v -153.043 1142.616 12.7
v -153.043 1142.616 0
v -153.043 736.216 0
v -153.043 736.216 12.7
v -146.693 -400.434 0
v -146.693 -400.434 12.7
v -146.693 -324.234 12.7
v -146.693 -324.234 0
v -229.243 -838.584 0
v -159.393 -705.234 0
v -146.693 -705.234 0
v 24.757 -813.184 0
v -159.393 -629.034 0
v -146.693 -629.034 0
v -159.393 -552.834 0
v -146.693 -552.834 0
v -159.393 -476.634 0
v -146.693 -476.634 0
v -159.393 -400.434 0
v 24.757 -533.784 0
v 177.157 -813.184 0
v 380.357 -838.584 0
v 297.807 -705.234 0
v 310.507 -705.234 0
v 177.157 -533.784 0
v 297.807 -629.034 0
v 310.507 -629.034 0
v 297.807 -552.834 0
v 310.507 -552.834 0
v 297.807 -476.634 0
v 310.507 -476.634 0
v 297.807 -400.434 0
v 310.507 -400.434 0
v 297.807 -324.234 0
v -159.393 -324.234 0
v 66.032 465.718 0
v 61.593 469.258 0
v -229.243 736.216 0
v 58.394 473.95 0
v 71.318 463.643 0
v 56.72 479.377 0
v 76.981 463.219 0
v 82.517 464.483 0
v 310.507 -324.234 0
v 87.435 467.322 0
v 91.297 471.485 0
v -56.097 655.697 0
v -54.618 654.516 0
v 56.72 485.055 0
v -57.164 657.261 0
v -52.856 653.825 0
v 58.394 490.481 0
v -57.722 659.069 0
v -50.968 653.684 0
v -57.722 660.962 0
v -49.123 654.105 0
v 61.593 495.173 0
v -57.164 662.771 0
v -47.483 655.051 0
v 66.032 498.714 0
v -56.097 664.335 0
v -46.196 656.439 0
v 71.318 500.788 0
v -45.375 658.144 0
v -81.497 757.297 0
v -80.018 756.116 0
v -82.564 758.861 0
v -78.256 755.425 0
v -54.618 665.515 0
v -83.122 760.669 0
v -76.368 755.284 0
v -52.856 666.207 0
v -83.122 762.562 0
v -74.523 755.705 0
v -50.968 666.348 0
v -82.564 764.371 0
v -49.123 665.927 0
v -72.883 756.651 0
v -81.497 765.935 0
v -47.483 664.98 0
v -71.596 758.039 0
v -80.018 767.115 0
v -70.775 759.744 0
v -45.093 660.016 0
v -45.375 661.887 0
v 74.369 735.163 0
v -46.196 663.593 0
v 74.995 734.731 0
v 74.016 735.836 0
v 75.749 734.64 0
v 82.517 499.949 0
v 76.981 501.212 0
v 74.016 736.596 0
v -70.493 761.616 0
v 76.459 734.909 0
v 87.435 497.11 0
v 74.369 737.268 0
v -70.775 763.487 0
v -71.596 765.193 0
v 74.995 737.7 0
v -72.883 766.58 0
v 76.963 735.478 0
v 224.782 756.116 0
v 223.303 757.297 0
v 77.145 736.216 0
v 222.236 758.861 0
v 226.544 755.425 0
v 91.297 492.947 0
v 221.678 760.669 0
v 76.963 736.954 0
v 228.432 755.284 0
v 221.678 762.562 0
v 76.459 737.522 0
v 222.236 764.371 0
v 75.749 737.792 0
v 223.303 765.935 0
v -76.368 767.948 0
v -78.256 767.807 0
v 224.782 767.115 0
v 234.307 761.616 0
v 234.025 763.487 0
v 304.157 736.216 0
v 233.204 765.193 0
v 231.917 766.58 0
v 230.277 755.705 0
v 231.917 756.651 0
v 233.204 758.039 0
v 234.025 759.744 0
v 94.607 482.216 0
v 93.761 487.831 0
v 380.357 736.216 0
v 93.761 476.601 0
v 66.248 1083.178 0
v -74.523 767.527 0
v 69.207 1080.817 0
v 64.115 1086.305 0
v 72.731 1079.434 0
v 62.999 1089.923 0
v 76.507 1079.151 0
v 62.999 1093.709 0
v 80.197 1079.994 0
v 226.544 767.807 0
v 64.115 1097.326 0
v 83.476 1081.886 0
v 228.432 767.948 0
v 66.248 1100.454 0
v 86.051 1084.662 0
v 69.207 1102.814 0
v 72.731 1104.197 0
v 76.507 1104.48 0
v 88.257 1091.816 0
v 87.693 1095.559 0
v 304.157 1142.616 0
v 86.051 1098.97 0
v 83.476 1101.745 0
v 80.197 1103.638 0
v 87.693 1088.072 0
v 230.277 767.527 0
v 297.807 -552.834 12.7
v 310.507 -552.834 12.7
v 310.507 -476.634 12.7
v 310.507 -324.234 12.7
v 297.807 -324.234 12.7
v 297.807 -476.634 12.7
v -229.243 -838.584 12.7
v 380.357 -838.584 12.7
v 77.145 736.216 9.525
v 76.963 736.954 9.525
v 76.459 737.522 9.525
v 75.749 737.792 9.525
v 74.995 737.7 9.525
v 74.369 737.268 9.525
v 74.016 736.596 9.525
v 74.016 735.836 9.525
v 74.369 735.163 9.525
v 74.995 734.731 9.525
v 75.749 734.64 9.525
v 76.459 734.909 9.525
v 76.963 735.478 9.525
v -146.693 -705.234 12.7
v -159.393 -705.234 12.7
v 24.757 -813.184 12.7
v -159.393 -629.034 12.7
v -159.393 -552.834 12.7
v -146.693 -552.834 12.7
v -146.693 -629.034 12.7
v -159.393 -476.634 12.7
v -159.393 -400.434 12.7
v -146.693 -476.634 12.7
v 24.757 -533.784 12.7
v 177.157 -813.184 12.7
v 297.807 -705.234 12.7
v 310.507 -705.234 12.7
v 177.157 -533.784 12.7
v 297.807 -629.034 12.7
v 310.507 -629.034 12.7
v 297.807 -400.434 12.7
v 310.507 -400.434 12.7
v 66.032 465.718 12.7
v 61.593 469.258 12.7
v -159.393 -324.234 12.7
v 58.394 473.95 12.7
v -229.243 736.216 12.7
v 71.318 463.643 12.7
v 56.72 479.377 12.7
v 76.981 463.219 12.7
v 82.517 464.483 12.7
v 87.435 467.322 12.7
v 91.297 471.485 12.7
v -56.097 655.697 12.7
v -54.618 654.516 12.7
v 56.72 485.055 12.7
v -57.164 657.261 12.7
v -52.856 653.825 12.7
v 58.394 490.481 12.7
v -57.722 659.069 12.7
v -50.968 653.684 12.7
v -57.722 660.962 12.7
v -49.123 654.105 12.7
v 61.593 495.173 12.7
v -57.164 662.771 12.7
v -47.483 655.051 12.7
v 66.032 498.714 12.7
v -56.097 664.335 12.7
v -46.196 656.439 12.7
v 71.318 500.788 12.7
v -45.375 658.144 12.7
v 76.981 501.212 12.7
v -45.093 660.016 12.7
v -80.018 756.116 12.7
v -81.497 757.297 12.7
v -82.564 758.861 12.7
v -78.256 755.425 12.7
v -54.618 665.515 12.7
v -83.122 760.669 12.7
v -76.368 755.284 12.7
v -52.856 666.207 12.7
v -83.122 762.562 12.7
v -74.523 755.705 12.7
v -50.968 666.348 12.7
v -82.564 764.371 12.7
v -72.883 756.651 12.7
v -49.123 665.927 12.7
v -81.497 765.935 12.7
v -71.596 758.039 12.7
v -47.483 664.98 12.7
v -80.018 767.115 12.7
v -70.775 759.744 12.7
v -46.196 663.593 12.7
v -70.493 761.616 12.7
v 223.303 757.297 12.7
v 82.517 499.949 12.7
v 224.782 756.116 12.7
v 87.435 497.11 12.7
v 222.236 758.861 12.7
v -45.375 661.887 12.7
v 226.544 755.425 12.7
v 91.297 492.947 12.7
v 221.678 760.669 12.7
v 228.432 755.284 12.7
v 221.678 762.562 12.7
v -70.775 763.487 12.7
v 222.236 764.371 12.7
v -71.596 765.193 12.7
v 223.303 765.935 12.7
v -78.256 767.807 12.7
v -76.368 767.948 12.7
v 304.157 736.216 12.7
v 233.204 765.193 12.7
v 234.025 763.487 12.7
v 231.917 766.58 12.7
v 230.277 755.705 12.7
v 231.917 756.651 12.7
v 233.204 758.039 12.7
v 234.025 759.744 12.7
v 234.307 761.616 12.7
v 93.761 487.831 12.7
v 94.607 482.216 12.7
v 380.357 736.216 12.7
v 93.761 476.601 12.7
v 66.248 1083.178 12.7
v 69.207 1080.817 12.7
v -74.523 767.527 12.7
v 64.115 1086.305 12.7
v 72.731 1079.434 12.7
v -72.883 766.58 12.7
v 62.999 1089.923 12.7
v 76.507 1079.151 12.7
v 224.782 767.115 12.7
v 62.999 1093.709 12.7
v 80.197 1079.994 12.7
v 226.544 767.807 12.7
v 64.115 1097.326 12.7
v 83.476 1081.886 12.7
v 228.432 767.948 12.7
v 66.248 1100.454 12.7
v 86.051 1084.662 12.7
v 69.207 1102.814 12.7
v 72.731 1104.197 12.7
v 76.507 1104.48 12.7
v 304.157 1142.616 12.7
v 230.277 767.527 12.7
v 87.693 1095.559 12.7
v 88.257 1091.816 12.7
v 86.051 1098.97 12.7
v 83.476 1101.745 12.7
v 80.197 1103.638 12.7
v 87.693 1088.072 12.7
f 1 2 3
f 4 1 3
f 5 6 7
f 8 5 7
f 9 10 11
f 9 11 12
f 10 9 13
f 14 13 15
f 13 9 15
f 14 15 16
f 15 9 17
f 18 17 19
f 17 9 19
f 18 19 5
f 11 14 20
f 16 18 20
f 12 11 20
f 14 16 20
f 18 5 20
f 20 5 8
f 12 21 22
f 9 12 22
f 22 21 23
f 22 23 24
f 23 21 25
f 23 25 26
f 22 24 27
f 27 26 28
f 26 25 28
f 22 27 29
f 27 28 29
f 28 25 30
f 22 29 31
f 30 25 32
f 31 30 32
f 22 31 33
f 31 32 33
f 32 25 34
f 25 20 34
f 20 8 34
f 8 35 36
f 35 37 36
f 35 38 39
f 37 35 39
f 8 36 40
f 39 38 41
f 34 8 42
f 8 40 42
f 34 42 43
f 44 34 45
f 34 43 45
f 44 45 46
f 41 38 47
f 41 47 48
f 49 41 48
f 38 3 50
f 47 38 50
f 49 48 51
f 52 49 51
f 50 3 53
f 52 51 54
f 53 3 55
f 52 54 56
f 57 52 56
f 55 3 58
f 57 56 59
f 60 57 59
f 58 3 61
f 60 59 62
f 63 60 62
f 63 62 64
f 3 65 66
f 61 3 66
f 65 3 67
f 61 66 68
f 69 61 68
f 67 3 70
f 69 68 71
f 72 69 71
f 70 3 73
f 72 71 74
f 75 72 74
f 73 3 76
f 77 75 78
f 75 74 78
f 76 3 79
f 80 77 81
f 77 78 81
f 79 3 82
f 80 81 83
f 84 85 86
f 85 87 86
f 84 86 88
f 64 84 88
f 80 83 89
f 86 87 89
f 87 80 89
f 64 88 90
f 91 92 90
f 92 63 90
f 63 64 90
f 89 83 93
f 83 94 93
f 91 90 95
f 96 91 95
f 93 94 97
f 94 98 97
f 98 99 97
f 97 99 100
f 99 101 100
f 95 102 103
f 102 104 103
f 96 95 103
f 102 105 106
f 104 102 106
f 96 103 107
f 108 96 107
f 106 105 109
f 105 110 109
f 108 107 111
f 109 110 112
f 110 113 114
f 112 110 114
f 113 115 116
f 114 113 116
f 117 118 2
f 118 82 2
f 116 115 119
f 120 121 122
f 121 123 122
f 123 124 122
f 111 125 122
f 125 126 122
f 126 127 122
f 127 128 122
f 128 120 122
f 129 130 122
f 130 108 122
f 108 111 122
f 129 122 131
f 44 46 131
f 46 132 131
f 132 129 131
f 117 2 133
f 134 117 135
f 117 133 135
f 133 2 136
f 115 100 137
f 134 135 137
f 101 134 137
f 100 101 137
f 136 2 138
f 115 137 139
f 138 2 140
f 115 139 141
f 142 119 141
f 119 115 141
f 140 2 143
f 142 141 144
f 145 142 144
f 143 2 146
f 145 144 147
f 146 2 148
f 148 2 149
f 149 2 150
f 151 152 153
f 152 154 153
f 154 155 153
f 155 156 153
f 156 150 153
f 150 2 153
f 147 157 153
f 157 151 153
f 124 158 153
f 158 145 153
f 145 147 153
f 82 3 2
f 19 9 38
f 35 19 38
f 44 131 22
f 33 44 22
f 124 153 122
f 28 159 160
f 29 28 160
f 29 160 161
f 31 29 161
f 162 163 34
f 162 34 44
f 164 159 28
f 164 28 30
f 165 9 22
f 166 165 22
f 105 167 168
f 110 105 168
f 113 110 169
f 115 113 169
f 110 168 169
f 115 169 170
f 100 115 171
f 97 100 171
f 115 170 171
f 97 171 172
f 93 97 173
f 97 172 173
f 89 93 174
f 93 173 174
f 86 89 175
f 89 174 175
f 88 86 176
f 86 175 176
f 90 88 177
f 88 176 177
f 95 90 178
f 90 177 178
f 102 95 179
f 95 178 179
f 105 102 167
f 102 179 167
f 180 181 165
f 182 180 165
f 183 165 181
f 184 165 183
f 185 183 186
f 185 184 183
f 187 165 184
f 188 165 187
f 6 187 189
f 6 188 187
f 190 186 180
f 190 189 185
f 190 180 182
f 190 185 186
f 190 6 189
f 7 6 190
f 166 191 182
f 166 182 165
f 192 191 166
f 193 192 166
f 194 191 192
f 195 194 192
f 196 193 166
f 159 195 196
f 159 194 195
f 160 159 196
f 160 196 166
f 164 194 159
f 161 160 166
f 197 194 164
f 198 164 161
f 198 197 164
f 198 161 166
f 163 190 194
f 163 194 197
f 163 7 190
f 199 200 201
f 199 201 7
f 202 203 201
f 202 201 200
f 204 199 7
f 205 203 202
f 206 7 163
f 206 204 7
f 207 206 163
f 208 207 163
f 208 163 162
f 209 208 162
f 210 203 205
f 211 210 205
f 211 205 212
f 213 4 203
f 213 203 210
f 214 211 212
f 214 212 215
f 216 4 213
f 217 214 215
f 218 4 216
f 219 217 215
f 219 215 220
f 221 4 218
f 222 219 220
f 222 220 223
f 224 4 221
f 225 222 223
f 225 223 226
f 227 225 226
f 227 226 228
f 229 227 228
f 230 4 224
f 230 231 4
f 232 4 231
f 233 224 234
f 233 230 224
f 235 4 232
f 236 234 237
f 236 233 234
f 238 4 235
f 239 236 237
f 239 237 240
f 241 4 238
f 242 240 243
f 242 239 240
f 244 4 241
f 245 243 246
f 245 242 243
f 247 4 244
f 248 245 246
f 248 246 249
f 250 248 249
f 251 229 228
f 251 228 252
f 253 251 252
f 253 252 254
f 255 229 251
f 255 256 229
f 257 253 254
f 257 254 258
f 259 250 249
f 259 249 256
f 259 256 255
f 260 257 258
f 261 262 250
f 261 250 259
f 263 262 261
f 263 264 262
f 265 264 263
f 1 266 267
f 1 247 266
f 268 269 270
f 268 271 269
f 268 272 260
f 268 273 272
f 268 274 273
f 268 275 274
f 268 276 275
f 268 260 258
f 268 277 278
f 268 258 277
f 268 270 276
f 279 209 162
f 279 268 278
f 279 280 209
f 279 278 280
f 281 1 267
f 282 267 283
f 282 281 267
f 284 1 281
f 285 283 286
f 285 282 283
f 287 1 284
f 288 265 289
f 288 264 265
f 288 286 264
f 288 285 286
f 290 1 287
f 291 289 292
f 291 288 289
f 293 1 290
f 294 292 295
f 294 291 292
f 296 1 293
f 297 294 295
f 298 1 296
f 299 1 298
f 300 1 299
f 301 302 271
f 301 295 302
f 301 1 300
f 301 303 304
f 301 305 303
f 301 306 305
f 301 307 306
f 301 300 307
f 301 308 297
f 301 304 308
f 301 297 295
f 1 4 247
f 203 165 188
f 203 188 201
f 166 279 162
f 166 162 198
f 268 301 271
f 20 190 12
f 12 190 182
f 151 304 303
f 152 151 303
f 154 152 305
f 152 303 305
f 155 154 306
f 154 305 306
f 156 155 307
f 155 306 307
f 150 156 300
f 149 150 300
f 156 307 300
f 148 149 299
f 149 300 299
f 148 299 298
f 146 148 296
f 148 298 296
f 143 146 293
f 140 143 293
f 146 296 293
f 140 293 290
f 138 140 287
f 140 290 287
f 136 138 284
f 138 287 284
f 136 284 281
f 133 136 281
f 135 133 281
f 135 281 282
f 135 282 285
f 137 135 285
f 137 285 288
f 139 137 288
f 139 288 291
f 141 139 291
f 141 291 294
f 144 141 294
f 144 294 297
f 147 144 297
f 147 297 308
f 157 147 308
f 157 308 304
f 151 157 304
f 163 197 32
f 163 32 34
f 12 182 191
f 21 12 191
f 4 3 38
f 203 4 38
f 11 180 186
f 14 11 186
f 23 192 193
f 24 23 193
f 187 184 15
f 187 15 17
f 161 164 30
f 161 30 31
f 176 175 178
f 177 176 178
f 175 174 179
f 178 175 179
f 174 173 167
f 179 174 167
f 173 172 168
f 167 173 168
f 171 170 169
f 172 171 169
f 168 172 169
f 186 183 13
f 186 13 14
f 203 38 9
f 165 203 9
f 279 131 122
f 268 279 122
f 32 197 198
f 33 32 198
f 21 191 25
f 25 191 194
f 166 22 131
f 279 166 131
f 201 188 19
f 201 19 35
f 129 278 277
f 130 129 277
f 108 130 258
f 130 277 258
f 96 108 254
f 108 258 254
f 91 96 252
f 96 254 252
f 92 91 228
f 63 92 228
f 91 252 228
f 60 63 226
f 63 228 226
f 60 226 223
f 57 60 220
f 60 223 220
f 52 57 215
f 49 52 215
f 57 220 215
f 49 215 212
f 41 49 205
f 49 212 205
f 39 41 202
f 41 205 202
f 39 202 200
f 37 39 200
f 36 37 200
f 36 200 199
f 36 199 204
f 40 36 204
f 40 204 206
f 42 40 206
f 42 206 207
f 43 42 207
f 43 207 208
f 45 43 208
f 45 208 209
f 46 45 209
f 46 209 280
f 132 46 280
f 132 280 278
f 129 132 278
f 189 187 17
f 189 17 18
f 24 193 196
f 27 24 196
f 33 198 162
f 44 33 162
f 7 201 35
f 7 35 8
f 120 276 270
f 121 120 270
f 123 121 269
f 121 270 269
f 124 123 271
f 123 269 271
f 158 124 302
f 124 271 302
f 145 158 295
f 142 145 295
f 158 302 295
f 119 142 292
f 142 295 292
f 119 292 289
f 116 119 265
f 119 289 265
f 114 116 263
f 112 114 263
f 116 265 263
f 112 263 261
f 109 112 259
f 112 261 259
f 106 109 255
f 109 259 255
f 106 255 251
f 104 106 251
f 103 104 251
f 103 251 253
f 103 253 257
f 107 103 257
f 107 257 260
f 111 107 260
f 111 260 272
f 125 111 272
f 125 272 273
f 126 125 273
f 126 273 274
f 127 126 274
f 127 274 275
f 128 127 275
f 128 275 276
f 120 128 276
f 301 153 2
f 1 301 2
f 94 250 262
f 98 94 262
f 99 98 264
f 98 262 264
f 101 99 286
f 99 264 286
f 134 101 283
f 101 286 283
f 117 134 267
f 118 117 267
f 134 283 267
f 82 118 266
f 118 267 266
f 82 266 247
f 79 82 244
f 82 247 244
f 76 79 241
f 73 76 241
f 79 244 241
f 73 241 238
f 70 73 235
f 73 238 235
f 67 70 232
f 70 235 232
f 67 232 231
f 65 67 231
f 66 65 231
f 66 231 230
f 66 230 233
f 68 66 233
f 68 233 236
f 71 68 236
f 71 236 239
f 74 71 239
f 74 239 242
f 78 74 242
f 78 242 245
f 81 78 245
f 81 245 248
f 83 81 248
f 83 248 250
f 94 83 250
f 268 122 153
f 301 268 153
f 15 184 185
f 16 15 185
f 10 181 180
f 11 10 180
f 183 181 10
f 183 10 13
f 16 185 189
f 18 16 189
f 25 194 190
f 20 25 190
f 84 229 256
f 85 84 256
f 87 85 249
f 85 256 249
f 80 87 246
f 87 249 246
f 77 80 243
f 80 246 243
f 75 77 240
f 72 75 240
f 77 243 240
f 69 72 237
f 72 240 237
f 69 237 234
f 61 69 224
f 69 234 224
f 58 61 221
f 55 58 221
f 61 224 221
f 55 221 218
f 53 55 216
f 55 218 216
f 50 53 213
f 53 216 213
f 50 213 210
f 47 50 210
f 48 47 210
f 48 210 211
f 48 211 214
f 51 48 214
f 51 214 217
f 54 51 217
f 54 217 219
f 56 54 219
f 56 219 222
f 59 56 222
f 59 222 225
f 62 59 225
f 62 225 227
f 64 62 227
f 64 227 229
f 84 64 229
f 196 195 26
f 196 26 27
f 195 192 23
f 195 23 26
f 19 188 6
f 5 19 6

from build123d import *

# Parameters (mm, degrees)
F1_DEPTH = 12.7
F2_R     = 12.7
F3_DEPTH = 19.05
F4_W     = 12.7
F4_H     = 76.2
F4_R     = 6.35
F4_R_2   = 1.5875
F4_R_3   = 19.05
F5_DEPTH = 19.05
F6_DEPTH = 12.7
F7_R     = 1.5875
F8_DEPTH = 3.175


with BuildPart() as f1:
    # F0 (on Top) → F1 (new body)
    with BuildSketch(Plane.XY):
        Polygon((304.157444, 1142.615758), (-153.042556, 1142.615758), (-153.042556, 736.215758), (-229.242556, 736.215758), (-229.242556, -838.584242), (-63.805879, -838.584242), (380.357444, -838.584242), (380.357444, 736.215758), (304.157444, 736.215758), align=None)
    extrude(amount=F1_DEPTH)

    # F2 (on face) → F3 (cut)
    with BuildSketch(Plane.XY.offset(12.7)):
        Polygon((177.157444, -533.784242), (126.357444, -533.784242), (24.757444, -533.784242), (24.757444, -813.184242), (126.357444, -813.184242), (177.157444, -813.184242), align=None)
        with Locations((75.557444, 1091.815758)):
            Circle(F2_R)
    extrude(amount=-F3_DEPTH, mode=Mode.SUBTRACT)

    # F4 (on face) → F5 (cut)
    with BuildSketch(Plane.XY.offset(12.7)):
        with Locations((-153.042556, -667.134242)):
            Rectangle(F4_W, F4_H)
        with Locations((-153.042556, -514.734242)):
            Rectangle(F4_W, F4_H)
        with Locations((-153.042556, -362.334242)):
            Rectangle(F4_W, F4_H)
        with Locations((304.157444, -514.734242)):
            Rectangle(F4_W, F4_H)
        with Locations((304.157444, -667.134242)):
            Rectangle(F4_W, F4_H)
        with Locations((304.157444, -362.334242)):
            Rectangle(F4_W, F4_H)
        with Locations((227.957444, 761.615758)):
            Circle(F4_R)
        with Locations((-76.842556, 761.615758)):
            Circle(F4_R)
        with Locations((75.557444, 736.215758)):
            Circle(F4_R_2)
        with Locations((75.557444, 482.215758)):
            Circle(F4_R_3)
        with Locations((-51.442556, 660.015758)):
            Circle(F4_R)
    extrude(amount=-F5_DEPTH, mode=Mode.SUBTRACT)

    # F4 (on face) → F6 (cut)
    with BuildSketch(Plane.XY.offset(12.7)):
        with Locations((-153.042556, -667.134242)):
            Rectangle(F4_W, F4_H)
        with Locations((-153.042556, -514.734242)):
            Rectangle(F4_W, F4_H)
        with Locations((-153.042556, -362.334242)):
            Rectangle(F4_W, F4_H)
        with Locations((304.157444, -514.734242)):
            Rectangle(F4_W, F4_H)
        with Locations((304.157444, -667.134242)):
            Rectangle(F4_W, F4_H)
        with Locations((304.157444, -362.334242)):
            Rectangle(F4_W, F4_H)
        with Locations((227.957444, 761.615758)):
            Circle(F4_R)
        with Locations((-76.842556, 761.615758)):
            Circle(F4_R)
        with Locations((75.557444, 736.215758)):
            Circle(F4_R_2)
        with Locations((75.557444, 482.215758)):
            Circle(F4_R_3)
        with Locations((-51.442556, 660.015758)):
            Circle(F4_R)
    extrude(amount=-F6_DEPTH, mode=Mode.SUBTRACT)

    # F7 (on face) → F8 (join)
    with BuildSketch(Plane.XY.offset(12.7)):
        with Locations((75.557444, 736.215758)):
            Circle(F7_R)
    extrude(amount=-F8_DEPTH)


solid = f1.part
